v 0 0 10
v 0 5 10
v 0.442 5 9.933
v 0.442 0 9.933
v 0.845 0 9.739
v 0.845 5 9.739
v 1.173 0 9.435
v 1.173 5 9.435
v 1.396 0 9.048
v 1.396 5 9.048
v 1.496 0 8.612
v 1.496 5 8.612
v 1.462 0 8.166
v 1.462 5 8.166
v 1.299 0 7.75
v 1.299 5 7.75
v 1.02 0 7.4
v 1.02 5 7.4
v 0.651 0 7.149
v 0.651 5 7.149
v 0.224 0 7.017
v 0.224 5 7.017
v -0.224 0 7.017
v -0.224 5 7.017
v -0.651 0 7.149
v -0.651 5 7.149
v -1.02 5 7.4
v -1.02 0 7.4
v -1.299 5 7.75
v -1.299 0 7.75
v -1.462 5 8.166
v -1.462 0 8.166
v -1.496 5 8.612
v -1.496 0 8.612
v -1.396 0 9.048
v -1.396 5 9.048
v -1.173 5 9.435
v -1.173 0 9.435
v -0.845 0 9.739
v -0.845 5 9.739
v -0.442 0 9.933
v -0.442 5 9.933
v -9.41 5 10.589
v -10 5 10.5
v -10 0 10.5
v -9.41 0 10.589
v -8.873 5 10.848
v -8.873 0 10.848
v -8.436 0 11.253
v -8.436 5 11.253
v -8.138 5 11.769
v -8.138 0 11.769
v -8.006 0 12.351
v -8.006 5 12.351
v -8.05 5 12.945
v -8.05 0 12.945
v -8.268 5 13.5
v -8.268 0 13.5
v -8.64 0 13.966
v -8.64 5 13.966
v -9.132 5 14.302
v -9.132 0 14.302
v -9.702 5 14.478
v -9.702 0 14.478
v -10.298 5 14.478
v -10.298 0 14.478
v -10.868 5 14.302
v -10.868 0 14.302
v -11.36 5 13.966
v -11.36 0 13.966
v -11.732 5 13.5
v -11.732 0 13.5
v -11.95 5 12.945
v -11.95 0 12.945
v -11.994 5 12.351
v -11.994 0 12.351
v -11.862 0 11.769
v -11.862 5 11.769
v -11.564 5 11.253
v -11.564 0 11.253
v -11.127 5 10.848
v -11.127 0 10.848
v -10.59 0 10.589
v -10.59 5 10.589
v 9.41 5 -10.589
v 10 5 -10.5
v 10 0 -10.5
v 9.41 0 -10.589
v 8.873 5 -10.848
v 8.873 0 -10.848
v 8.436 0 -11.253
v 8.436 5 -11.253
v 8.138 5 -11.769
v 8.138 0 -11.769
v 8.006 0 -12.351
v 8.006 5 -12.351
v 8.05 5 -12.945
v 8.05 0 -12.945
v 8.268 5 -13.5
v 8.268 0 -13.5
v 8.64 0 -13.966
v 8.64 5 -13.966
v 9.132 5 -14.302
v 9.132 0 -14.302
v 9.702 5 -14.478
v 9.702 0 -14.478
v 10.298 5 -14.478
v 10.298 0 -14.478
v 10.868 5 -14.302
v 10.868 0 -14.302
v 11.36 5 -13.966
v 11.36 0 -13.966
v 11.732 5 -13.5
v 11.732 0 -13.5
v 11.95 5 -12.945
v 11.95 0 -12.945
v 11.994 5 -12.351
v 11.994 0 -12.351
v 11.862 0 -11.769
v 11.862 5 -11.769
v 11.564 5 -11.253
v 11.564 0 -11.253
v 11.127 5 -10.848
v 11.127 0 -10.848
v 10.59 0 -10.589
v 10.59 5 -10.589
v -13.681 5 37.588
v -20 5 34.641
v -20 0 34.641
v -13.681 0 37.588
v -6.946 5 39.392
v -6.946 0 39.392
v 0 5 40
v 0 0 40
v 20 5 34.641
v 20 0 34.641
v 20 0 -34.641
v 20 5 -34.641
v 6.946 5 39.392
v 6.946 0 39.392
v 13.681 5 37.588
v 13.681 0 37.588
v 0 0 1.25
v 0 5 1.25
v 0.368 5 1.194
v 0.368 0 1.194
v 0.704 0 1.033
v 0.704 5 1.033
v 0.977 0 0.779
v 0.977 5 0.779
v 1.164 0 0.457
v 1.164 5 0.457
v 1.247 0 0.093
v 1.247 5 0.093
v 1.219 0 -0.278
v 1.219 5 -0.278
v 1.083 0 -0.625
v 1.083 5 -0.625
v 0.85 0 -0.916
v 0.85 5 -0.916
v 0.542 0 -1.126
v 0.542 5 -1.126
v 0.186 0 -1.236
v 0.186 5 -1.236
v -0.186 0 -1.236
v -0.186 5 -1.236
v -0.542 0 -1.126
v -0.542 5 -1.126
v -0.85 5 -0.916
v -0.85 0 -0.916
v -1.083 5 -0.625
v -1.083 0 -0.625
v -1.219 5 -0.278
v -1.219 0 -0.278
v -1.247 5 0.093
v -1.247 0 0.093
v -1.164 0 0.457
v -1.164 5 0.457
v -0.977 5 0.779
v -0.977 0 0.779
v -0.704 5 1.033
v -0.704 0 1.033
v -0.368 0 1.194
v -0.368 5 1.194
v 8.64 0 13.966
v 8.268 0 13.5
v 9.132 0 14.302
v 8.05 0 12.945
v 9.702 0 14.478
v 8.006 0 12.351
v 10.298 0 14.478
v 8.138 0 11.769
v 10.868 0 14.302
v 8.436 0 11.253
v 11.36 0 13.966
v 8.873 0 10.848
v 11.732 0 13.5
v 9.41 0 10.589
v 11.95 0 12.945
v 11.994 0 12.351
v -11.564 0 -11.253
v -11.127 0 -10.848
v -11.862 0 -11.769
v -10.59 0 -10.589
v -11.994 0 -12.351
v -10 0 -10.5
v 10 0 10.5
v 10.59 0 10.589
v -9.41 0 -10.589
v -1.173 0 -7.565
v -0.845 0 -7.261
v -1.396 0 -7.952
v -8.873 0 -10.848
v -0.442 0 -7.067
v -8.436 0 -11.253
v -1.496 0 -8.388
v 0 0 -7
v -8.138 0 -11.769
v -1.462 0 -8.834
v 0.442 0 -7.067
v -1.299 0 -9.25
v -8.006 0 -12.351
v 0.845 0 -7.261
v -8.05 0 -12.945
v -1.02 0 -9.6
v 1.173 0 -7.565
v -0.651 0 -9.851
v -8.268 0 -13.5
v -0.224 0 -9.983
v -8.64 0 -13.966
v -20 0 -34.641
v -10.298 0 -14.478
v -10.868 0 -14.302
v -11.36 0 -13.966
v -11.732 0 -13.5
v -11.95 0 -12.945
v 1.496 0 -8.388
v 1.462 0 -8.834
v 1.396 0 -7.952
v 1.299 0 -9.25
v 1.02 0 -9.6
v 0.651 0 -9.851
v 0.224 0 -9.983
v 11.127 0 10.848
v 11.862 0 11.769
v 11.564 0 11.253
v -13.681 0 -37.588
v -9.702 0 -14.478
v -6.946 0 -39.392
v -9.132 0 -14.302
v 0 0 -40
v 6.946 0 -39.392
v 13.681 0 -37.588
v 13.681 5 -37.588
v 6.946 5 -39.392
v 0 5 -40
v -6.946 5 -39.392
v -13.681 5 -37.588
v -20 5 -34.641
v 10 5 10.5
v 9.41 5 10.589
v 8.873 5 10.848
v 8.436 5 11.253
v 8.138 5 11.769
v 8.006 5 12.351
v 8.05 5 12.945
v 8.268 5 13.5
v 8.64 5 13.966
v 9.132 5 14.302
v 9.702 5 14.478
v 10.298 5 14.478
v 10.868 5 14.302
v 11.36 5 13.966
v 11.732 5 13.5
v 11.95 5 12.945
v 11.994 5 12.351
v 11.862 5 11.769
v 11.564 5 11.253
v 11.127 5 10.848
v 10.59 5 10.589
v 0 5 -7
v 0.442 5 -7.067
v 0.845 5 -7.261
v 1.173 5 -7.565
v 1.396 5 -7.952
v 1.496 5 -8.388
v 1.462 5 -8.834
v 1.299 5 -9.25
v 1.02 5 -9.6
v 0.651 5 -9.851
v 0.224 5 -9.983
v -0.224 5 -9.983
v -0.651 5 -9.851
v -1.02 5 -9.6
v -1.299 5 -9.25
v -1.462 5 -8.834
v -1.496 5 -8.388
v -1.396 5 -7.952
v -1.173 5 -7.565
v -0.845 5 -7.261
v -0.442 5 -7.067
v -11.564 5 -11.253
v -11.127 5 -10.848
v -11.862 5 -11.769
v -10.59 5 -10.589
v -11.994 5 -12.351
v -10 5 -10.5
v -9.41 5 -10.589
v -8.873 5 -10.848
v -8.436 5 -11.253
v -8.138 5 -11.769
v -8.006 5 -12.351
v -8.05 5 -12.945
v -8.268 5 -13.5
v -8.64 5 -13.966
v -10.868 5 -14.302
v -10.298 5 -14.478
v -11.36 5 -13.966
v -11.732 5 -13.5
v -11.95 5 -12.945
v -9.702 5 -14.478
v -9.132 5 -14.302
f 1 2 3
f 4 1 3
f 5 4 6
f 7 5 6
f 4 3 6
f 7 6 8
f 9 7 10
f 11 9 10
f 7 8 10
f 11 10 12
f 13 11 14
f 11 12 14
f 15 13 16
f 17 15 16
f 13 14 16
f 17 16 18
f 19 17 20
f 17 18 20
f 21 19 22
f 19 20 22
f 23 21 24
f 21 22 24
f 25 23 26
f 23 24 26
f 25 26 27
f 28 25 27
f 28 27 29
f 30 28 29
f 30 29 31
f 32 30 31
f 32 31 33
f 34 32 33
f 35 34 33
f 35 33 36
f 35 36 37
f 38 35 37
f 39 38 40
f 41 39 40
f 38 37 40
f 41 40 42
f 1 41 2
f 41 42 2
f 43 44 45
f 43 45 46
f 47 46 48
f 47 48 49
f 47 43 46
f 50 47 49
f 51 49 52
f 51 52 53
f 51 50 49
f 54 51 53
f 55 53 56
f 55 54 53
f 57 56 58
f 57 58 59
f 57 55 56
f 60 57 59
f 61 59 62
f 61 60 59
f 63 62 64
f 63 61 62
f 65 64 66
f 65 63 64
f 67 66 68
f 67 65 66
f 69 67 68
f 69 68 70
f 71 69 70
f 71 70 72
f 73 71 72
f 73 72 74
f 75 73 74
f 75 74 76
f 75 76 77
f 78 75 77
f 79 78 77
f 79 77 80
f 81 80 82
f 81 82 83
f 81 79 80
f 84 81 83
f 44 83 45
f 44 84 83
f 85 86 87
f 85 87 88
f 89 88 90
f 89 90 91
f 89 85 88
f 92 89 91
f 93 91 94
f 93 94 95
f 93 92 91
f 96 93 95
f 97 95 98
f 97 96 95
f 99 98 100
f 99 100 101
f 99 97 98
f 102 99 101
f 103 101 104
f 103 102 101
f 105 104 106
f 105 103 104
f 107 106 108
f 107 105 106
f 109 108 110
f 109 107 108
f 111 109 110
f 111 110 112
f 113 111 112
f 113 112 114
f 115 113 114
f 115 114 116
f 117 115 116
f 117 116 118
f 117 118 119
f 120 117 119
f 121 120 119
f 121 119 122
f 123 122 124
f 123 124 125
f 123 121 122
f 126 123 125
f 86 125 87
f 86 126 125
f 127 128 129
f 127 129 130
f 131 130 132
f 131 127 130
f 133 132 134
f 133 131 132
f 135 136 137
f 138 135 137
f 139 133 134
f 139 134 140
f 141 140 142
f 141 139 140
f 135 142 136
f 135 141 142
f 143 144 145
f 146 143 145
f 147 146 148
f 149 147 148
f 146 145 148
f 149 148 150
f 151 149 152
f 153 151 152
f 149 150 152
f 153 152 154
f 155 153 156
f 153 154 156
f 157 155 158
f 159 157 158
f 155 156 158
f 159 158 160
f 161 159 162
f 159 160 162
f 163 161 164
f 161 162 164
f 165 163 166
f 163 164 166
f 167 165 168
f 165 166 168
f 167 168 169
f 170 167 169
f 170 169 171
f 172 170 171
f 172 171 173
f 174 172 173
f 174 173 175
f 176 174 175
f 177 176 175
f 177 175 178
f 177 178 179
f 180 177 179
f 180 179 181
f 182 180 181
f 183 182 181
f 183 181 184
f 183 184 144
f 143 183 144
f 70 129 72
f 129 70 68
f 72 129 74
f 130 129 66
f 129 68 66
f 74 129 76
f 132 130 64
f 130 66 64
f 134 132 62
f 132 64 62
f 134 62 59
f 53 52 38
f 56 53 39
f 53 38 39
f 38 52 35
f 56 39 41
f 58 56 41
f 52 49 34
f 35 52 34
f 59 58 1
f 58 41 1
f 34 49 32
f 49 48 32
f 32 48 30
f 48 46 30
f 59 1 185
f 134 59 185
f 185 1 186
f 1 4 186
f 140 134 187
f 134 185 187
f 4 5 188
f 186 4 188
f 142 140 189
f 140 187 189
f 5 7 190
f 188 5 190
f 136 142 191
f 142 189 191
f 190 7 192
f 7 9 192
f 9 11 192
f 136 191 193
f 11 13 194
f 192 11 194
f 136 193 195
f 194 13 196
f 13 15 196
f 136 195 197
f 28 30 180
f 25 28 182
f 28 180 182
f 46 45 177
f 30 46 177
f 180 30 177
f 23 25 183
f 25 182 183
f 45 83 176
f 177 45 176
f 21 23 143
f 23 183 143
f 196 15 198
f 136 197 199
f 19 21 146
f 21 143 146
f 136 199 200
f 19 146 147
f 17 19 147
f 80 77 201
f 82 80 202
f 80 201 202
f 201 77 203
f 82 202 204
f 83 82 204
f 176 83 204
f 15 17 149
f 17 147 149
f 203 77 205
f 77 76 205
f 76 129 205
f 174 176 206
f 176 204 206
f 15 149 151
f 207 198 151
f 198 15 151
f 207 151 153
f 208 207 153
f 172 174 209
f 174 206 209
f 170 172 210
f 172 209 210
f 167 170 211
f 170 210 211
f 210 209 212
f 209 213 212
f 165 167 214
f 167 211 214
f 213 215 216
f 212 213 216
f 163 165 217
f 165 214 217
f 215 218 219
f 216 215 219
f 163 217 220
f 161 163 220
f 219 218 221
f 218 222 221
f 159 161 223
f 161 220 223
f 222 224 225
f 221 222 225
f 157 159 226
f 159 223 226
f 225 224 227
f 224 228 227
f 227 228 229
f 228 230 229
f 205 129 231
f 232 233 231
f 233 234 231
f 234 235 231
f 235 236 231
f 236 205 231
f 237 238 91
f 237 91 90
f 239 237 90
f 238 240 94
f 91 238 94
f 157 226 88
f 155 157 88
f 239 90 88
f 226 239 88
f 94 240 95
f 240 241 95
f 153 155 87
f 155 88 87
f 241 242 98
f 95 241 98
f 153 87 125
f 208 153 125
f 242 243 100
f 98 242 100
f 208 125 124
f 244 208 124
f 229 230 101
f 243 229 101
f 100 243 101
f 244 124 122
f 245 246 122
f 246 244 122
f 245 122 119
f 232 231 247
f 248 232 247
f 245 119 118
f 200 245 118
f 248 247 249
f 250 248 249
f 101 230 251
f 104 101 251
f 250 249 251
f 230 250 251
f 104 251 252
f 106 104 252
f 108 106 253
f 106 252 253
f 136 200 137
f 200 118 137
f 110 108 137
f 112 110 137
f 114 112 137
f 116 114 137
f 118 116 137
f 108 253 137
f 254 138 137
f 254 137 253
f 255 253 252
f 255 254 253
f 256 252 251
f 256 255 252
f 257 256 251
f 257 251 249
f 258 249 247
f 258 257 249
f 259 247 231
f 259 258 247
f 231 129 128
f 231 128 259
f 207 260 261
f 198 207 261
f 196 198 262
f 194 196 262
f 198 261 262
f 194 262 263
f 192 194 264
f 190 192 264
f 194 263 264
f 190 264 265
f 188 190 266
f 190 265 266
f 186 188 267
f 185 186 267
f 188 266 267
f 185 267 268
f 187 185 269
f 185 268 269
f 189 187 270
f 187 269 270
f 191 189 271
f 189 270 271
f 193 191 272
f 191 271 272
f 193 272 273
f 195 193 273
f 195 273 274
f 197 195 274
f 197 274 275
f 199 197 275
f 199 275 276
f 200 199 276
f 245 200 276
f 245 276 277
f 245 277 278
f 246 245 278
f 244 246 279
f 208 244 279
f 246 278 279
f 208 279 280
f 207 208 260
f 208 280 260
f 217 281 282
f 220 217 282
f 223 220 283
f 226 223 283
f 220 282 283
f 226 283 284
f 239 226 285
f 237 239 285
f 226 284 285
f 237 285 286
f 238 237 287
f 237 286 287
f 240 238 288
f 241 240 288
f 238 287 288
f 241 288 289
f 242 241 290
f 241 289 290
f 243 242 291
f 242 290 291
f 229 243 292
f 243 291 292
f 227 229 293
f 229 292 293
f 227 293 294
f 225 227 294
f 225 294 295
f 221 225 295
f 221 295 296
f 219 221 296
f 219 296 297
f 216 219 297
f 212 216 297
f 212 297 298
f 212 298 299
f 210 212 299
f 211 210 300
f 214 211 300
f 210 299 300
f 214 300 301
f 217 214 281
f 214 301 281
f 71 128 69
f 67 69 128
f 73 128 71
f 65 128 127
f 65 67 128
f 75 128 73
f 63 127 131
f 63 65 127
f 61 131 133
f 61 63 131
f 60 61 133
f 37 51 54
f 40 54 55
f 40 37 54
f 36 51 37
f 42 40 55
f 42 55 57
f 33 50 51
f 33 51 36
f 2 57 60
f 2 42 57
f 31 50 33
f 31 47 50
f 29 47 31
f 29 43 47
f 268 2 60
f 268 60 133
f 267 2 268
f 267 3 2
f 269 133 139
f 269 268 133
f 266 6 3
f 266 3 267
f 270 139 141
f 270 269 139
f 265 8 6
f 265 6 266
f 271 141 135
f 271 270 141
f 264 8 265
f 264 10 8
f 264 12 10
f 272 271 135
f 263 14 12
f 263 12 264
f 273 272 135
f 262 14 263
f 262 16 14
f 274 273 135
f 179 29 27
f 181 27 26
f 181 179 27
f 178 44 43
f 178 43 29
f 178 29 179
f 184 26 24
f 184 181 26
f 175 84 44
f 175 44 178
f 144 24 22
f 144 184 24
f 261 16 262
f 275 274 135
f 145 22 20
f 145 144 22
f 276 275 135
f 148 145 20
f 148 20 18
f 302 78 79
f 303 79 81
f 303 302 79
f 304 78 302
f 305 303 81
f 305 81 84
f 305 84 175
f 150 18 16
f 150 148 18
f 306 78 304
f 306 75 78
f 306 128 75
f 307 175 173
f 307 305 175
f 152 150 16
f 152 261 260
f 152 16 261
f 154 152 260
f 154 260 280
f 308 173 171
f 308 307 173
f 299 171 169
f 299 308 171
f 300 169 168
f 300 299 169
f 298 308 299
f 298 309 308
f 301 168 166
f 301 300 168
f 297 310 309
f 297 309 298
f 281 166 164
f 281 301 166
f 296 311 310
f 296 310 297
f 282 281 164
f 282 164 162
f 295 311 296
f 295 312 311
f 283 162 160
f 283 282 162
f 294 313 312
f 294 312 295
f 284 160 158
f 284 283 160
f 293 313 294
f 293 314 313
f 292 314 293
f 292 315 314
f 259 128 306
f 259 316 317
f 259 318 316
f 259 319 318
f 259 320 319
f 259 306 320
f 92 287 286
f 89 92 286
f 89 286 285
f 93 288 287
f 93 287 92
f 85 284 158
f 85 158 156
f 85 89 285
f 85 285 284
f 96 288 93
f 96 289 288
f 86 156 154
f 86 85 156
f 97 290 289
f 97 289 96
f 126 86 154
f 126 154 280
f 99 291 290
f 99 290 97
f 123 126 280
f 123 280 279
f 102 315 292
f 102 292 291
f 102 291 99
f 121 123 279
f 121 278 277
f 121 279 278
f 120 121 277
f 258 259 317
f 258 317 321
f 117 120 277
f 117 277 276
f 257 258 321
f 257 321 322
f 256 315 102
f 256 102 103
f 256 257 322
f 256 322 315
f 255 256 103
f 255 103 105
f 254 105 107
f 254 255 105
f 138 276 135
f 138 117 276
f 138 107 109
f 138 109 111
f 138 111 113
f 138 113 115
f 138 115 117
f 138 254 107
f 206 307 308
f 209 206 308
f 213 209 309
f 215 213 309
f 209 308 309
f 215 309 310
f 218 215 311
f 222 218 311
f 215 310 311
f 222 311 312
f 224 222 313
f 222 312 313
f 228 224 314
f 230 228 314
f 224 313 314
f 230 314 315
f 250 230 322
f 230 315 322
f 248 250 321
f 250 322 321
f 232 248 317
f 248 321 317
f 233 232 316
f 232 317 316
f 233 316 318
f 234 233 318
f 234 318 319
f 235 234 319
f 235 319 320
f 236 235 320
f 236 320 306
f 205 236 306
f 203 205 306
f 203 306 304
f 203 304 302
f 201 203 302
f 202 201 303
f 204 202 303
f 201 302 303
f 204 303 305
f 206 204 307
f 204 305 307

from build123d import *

# Parameters (mm, degrees)
ESQUISSE1_W               = 40
ESQUISSE1_H               = 80
BOSS_EXTRU_1_DEPTH        = 5
ESQUISSE2_R               = 1.5
ENL_V_MAT_EXTRU_1_DEPTH   = 5
ENL_V_START               = -5
ENL_V_MAT_EXTRU_5_DEPTH   = 5
ESQUISSE13_R              = 2
ENL_V_MAT_EXTRU_9_DEPTH   = 5
SYM_TRIE6_COPY_1_SKETCH_R = 2
SYM_TRIE6_COPY_1_DEPTH    = 5
ESQUISSE15_R              = 1.25
ENL_V_MAT_EXTRU_10_DEPTH  = 10


# Read off the part's stored shape, not the designer's step: Enlèv. mat.-Extru.5
with BuildPart() as part:
    # Esquisse1 → Boss.-Extru.1 (new body)
    with BuildSketch(Plane(origin=(0, 0, 0), x_dir=(1, 0, 0), z_dir=(0, 1, 0))):
        Rectangle(ESQUISSE1_W, ESQUISSE1_H)
    extrude(amount=BOSS_EXTRU_1_DEPTH)

    # Esquisse2 → Enlèv. mat.-Extru.1 (cut)
    with BuildSketch(Plane(origin=(0, 5, 0), x_dir=(1, 0, 0), z_dir=(0, 1, 0))):
        with Locations(Location((0, 8.5, 0), (0, 0, 270))):
            Circle(ESQUISSE2_R)
        with Locations(Location((0, -8.5, 0), (0, 0, 270))):
            Circle(ESQUISSE2_R)
    extrude(amount=-ENL_V_MAT_EXTRU_1_DEPTH, mode=Mode.SUBTRACT)

    # Enlèv. mat.-Extru.5 outline → Enlèv. mat.-Extru.5 (cut)
    with BuildSketch(Plane(origin=(0, 0, 0), x_dir=(-1, 0, 0), z_dir=(0, -1, 0)).offset(ENL_V_START)):
        with BuildLine():
            ThreePointArc((0, -40), (-10.352761804, -38.637033051), (-20, -34.641016151))
            Line((-20, -34.641016151), (-20, -40))
            Line((-20, -40), (0, -40))
        make_face()
        with BuildLine():
            ThreePointArc((20, -34.641016151), (10.352761804, -38.637033051), (0, -40))
            Line((0, -40), (20, -40))
            Line((20, -40), (20, -34.641016151))
        make_face()
        with BuildLine():
            Line((-20, 40), (-20, 34.641016151))
            ThreePointArc((-20, 34.641016151), (-10.352761804, 38.637033051), (0, 40))
            Line((0, 40), (-20, 40))
        make_face()
        with BuildLine():
            Line((20, 40), (0, 40))
            ThreePointArc((0, 40), (10.352761804, 38.637033051), (20, 34.641016151))
            Line((20, 34.641016151), (20, 40))
        make_face()
    extrude(amount=ENL_V_MAT_EXTRU_5_DEPTH, mode=Mode.SUBTRACT)

    # Esquisse13 → Enlèv. mat.-Extru.9 (cut)
    with BuildSketch(Plane(origin=(0, 5, 0), x_dir=(1, 0, 0), z_dir=(0, 1, 0))):
        with Locations(Location((-10, 12.5, 0), (0, 0, 270))):
            Circle(ESQUISSE13_R)
    enl_v_mat_extru_9 = extrude(amount=-ENL_V_MAT_EXTRU_9_DEPTH, mode=Mode.SUBTRACT)

    # Symétrie5: Enlèv. mat.-Extru.9 across plane
    add(enl_v_mat_extru_9.mirror(Plane(origin=(0, 0, 0), x_dir=(0, 0, 1), z_dir=(1, 0, 0))), mode=Mode.SUBTRACT)

    # Symétrie6: Enlèv. mat.-Extru.9 across plane
    add(enl_v_mat_extru_9.mirror(Plane.XY), mode=Mode.SUBTRACT)

    # Symétrie6 copy 1 sketch → Symétrie6 copy 1 (cut)
    with BuildSketch(Plane(origin=(0, 5, 0), x_dir=(-1, 0, 0), z_dir=(0, 1, 0))):
        with Locations(Location((-10, 12.5, 0), (0, 0, 270))):
            Circle(SYM_TRIE6_COPY_1_SKETCH_R)
    extrude(amount=-SYM_TRIE6_COPY_1_DEPTH, mode=Mode.SUBTRACT)

    # Esquisse15 → Enlèv. mat.-Extru.10 (cut)
    with BuildSketch(Plane(origin=(0, 5, 0), x_dir=(1, 0, 0), z_dir=(0, 1, 0))):
        with Locations(Location((0, 0, 0), (0, 0, 270))):
            Circle(ESQUISSE15_R)
    extrude(amount=-ENL_V_MAT_EXTRU_10_DEPTH, mode=Mode.SUBTRACT)


solid = part.part
